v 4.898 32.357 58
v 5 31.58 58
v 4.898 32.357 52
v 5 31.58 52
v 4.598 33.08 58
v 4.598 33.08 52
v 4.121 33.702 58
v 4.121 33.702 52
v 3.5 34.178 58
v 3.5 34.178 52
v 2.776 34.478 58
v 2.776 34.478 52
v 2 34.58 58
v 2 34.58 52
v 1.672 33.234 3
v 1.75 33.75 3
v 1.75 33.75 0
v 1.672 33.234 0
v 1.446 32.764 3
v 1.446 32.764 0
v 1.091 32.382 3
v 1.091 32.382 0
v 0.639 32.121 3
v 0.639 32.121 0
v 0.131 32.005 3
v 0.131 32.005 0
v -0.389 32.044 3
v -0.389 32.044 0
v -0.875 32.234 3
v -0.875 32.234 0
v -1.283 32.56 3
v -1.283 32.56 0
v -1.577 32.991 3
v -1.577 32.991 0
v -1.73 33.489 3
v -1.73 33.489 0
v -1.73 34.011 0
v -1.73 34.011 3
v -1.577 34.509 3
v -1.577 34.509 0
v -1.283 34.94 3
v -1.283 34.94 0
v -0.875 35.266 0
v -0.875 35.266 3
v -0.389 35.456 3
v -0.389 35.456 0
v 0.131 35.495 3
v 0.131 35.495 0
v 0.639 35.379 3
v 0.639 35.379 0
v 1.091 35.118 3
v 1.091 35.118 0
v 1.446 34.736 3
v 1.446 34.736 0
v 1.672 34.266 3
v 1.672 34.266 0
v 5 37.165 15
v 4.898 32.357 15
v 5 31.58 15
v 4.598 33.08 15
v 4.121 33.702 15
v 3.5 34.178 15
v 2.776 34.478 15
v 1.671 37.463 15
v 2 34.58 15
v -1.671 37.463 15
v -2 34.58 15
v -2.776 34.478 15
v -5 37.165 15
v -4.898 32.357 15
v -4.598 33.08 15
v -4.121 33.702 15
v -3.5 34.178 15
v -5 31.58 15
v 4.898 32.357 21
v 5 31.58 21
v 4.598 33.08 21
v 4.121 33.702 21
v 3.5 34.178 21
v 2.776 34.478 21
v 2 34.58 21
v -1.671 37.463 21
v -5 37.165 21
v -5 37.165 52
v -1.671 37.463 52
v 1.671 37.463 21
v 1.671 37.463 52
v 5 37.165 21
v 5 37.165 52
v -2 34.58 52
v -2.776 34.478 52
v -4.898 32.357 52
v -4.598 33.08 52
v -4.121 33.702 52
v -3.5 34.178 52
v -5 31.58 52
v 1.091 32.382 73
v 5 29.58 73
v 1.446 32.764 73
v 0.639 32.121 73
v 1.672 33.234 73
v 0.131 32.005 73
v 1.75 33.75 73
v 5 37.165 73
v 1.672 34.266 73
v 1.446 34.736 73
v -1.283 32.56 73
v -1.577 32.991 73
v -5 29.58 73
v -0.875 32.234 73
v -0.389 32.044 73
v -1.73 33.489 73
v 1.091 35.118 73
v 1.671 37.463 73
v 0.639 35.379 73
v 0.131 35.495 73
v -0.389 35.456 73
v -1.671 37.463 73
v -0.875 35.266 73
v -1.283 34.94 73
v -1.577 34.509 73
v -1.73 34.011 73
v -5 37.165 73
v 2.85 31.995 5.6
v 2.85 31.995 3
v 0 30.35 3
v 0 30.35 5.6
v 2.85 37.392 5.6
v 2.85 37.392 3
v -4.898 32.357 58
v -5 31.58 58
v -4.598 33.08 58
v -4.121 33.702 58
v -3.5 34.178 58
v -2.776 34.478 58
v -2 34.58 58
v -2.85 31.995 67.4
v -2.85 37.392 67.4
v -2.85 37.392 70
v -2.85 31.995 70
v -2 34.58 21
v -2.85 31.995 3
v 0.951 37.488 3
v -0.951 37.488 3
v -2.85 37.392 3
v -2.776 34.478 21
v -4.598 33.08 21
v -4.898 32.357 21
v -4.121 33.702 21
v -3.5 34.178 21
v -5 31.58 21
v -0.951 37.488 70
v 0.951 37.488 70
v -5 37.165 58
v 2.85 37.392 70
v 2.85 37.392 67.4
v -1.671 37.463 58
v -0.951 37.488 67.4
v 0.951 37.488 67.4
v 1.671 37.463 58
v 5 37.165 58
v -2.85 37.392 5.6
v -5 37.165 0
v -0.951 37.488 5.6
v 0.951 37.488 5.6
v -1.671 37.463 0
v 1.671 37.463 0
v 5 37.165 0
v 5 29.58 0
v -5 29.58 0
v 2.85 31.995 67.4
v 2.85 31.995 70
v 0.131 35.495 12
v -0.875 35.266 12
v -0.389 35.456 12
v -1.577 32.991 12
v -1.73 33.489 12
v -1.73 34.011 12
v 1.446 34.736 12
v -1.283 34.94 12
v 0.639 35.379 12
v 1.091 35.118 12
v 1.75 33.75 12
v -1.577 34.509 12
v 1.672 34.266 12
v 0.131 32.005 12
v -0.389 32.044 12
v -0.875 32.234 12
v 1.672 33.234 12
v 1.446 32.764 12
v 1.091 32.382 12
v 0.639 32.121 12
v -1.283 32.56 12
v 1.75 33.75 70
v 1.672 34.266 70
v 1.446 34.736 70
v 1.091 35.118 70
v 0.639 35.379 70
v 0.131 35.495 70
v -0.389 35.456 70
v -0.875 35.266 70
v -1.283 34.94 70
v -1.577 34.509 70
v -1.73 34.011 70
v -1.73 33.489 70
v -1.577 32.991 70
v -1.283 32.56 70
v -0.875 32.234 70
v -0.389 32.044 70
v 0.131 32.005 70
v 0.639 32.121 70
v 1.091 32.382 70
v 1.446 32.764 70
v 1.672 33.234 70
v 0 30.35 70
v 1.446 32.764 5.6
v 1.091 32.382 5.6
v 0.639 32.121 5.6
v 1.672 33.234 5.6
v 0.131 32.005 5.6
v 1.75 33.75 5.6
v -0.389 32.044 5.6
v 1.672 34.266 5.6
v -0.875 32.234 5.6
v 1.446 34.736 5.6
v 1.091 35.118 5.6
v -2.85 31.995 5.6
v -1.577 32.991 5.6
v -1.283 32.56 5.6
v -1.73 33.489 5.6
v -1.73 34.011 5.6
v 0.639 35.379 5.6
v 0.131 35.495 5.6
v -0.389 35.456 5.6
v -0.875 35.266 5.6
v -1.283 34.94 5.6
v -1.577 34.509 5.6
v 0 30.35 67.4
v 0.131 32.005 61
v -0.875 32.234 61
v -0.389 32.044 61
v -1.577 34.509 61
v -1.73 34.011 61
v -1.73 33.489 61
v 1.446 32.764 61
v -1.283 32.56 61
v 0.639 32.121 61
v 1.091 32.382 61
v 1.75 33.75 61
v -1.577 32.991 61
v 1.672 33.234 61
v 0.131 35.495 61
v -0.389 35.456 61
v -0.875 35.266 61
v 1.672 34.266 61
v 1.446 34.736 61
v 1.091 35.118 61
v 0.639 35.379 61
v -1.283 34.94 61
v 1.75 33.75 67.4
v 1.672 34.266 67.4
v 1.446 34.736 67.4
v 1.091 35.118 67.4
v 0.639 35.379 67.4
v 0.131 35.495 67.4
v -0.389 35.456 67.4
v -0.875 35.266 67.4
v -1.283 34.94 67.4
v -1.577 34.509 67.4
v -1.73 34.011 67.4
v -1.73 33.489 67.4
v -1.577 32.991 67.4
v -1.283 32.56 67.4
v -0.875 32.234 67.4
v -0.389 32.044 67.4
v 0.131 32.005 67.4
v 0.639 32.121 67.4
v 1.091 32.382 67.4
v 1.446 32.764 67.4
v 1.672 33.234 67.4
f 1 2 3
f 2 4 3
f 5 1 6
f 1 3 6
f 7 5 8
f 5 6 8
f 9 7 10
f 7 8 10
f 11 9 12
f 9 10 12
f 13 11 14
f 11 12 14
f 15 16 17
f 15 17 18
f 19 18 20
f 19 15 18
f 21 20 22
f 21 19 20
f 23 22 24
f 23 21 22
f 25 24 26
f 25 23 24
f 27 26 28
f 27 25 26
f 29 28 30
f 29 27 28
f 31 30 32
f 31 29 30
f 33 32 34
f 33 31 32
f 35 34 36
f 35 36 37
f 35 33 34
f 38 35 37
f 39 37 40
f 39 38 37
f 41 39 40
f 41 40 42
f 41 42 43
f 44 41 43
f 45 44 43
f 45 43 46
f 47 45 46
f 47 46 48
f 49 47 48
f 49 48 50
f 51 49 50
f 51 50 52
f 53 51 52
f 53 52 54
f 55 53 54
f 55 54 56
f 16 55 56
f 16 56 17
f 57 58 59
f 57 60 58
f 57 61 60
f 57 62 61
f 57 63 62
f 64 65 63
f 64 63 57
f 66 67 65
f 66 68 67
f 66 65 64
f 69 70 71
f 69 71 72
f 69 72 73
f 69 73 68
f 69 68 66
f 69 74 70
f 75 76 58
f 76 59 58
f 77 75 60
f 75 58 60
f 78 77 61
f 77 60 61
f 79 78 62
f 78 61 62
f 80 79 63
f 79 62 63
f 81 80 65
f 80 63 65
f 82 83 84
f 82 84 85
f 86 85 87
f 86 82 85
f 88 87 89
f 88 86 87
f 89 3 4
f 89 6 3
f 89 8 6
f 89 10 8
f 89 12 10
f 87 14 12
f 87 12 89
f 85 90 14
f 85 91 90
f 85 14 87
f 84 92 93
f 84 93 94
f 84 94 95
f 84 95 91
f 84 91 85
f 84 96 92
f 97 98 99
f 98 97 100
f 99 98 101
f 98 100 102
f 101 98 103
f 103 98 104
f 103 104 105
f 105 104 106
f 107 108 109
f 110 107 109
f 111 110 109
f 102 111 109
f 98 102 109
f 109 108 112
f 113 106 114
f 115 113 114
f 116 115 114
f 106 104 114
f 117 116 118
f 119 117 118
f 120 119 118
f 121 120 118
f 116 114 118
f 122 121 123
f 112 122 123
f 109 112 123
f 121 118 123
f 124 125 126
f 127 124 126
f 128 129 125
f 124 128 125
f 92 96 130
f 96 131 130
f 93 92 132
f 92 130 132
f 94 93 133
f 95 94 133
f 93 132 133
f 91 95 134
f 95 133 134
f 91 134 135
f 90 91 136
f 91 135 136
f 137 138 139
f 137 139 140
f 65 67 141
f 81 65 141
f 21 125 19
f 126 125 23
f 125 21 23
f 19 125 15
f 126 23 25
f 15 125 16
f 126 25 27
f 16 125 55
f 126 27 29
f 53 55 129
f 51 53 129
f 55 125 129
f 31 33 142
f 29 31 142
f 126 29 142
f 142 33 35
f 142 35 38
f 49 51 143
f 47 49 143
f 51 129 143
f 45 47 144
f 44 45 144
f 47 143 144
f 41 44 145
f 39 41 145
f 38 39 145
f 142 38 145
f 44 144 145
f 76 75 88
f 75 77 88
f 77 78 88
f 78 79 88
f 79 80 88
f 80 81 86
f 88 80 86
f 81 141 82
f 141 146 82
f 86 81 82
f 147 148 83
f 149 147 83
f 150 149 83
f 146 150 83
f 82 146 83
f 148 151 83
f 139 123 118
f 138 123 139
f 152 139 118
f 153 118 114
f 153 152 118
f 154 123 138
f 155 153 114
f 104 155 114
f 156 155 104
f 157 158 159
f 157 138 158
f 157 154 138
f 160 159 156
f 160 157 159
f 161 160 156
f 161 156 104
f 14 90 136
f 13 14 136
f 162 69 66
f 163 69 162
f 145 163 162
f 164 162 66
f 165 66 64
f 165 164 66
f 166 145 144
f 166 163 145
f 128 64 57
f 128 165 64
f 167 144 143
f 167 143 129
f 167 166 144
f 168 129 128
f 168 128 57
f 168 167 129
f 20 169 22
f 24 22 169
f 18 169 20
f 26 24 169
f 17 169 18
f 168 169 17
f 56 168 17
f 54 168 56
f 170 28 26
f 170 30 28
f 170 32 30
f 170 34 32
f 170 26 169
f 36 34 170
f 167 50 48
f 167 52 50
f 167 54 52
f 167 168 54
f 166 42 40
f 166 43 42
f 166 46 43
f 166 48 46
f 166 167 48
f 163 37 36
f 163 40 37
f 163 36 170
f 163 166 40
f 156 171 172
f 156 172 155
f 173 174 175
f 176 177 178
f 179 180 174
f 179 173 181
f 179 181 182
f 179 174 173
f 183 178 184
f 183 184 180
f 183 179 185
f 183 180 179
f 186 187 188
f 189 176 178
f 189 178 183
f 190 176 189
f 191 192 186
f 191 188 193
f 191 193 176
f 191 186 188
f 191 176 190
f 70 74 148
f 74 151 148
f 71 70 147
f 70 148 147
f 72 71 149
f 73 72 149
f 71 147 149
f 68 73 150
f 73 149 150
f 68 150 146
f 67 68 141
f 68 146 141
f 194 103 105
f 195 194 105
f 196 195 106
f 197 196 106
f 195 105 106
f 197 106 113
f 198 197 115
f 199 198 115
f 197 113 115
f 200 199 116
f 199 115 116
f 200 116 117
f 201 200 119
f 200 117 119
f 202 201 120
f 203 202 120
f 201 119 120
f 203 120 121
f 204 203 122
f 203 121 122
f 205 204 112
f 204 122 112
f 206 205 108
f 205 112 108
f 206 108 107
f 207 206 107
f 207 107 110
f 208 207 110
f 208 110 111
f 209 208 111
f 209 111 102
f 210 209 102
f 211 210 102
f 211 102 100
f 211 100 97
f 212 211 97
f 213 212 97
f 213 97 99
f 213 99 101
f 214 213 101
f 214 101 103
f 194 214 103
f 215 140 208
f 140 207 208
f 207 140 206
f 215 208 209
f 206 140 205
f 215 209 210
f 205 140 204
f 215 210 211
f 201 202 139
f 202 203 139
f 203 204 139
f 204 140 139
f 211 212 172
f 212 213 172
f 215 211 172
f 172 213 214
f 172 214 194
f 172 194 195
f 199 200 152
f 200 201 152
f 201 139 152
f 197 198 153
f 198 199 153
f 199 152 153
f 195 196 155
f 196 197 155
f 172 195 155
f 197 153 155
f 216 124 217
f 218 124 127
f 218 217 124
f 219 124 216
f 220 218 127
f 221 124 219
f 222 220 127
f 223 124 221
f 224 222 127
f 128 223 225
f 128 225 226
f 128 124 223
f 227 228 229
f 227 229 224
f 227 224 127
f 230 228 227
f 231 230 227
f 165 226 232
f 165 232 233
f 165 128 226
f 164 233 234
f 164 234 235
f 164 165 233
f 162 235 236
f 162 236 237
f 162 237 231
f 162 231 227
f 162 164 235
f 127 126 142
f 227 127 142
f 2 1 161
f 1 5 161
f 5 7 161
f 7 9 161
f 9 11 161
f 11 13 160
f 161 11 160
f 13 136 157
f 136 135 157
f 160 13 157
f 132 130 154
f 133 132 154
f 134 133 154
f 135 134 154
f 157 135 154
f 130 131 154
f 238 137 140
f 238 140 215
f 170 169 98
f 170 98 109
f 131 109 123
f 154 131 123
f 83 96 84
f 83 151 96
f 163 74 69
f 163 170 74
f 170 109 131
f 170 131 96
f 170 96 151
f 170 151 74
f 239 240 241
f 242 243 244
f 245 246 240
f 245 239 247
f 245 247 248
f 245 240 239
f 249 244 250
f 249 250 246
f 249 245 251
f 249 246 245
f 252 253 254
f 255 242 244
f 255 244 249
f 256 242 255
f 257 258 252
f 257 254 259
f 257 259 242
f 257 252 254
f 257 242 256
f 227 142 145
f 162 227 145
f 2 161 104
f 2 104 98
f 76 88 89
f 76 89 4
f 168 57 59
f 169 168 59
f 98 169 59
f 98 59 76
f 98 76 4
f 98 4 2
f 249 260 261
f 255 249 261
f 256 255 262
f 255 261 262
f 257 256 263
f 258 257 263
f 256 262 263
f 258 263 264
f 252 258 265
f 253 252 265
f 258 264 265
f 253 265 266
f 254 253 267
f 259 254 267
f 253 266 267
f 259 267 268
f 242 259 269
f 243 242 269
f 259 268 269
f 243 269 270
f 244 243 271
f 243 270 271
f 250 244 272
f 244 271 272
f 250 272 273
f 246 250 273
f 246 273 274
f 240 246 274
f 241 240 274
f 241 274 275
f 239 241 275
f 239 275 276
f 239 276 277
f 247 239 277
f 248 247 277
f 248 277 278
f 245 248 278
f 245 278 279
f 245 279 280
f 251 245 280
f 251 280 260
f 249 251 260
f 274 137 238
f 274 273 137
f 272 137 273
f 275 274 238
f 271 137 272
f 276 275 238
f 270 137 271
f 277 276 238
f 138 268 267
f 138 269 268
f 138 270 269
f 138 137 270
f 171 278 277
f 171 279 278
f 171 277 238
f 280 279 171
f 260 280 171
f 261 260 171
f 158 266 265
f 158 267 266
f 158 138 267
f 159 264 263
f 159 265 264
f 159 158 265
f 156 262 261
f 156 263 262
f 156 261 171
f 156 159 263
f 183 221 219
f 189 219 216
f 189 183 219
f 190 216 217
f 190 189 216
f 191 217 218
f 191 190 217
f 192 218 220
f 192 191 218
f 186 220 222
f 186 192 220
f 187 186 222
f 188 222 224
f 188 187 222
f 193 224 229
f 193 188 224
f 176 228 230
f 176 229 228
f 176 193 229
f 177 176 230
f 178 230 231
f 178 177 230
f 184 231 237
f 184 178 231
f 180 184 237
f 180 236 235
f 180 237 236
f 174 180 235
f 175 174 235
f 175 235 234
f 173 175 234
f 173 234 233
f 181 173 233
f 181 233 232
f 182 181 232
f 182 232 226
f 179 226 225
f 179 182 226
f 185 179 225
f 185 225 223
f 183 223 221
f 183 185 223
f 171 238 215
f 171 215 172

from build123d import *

# Parameters (mm, degrees)
BOSS_EXTRU_2_DEPTH      = 73
ESQUISSE6_W             = 6
ESQUISSE6_H             = 5
ENL_V_MAT_EXTRU_3_DEPTH = 83.675570757
ESQUISSE7_R             = 1.75
ENL_V_MAT_EXTRU_4_DEPTH = 12
ENL_V_START             = -12
ESQUISSE8_R             = 1.75
ENL_V_MAT_EXTRU_5_DEPTH = 12
CONG_1_R                = 3
ENL_V_START_2           = -3
ENL_V_MAT_EXTRU_6_DEPTH = 2.6
ENL_V_START_3           = -5.6
ENL_V_MAT_EXTRU_7_DEPTH = 2.6


with BuildPart() as part:
    # Esquisse3 → Boss.-Extru.2 (new body)
    with BuildSketch(Plane.XY):
        with BuildLine():
            ThreePointArc((-5, 37.165171868), (0, 37.5), (5, 37.165171868))
            Line((5, 37.165171868), (5, 29.580398915))
            Line((5, 29.580398915), (-5, 29.580398915))
            Line((-5, 29.580398915), (-5, 37.165171868))
        make_face()
    extrude(amount=BOSS_EXTRU_2_DEPTH)

    # Esquisse6 → Enlèv. mat.-Extru.3 (cut, through all)
    with BuildSketch(Plane.ZY.offset(5)):
        with Locations((18, 37.080398915)):
            Rectangle(ESQUISSE6_W, ESQUISSE6_H)
        with Locations((55, 37.080398915)):
            Rectangle(ESQUISSE6_W, ESQUISSE6_H)
    extrude(amount=-ENL_V_MAT_EXTRU_3_DEPTH, mode=Mode.SUBTRACT)

    # Esquisse7 → Enlèv. mat.-Extru.4 (cut)
    with BuildSketch(Plane.XY.offset(73)):
        with Locations((0, 33.75)):
            Circle(ESQUISSE7_R)
    extrude(amount=-ENL_V_MAT_EXTRU_4_DEPTH, mode=Mode.SUBTRACT)

    # Esquisse8 → Enlèv. mat.-Extru.5 (cut)
    with BuildSketch(Plane(origin=(0, 0, 0), x_dir=(-1, 0, 0), z_dir=(0, 0, -1)).offset(ENL_V_START)):
        with Locations(Location((0, 33.75, 0), (0, 0, 180))):
            Circle(ESQUISSE8_R)
    extrude(amount=ENL_V_MAT_EXTRU_5_DEPTH, mode=Mode.SUBTRACT)

    # Congé1
    cong_1_edges = [part.edges().sort_by_distance(p)[0] for p in [
        (5, 34.580398915, 18),
        (-5, 34.580398915, 18),
        (5, 34.580398915, 55),
        (-5, 34.580398915, 55),
    ]]
    fillet(cong_1_edges, radius=CONG_1_R)

    # Esquisse9 → Enlèv. mat.-Extru.6 (cut)
    with BuildSketch(Plane(origin=(0, 0, 0), x_dir=(-1, 0, 0), z_dir=(0, 0, -1)).offset(ENL_V_START_2)):
        with BuildLine():
            Line((-2.85, 37.391543162), (-2.85, 31.995448267))
            Line((-2.85, 31.995448267), (0, 30.35))
            Line((0, 30.35), (2.85, 31.995448267))
            Line((2.85, 31.995448267), (2.85, 37.391543162))
            ThreePointArc((2.85, 37.391543162), (0, 37.5), (-2.85, 37.391543162))
        make_face()
    extrude(amount=-ENL_V_MAT_EXTRU_6_DEPTH, mode=Mode.SUBTRACT)

    # Esquisse10 → Enlèv. mat.-Extru.7 (cut)
    with BuildSketch(Plane.XY.offset(73).offset(ENL_V_START_3)):
        with BuildLine():
            Line((-2.85, 37.391543162), (-2.85, 31.995448267))
            Line((-2.85, 31.995448267), (0, 30.35))
            Line((0, 30.35), (2.85, 31.995448267))
            Line((2.85, 31.995448267), (2.85, 37.391543162))
            ThreePointArc((2.85, 37.391543162), (0, 37.5), (-2.85, 37.391543162))
        make_face()
    extrude(amount=ENL_V_MAT_EXTRU_7_DEPTH, mode=Mode.SUBTRACT)


solid = part.part
